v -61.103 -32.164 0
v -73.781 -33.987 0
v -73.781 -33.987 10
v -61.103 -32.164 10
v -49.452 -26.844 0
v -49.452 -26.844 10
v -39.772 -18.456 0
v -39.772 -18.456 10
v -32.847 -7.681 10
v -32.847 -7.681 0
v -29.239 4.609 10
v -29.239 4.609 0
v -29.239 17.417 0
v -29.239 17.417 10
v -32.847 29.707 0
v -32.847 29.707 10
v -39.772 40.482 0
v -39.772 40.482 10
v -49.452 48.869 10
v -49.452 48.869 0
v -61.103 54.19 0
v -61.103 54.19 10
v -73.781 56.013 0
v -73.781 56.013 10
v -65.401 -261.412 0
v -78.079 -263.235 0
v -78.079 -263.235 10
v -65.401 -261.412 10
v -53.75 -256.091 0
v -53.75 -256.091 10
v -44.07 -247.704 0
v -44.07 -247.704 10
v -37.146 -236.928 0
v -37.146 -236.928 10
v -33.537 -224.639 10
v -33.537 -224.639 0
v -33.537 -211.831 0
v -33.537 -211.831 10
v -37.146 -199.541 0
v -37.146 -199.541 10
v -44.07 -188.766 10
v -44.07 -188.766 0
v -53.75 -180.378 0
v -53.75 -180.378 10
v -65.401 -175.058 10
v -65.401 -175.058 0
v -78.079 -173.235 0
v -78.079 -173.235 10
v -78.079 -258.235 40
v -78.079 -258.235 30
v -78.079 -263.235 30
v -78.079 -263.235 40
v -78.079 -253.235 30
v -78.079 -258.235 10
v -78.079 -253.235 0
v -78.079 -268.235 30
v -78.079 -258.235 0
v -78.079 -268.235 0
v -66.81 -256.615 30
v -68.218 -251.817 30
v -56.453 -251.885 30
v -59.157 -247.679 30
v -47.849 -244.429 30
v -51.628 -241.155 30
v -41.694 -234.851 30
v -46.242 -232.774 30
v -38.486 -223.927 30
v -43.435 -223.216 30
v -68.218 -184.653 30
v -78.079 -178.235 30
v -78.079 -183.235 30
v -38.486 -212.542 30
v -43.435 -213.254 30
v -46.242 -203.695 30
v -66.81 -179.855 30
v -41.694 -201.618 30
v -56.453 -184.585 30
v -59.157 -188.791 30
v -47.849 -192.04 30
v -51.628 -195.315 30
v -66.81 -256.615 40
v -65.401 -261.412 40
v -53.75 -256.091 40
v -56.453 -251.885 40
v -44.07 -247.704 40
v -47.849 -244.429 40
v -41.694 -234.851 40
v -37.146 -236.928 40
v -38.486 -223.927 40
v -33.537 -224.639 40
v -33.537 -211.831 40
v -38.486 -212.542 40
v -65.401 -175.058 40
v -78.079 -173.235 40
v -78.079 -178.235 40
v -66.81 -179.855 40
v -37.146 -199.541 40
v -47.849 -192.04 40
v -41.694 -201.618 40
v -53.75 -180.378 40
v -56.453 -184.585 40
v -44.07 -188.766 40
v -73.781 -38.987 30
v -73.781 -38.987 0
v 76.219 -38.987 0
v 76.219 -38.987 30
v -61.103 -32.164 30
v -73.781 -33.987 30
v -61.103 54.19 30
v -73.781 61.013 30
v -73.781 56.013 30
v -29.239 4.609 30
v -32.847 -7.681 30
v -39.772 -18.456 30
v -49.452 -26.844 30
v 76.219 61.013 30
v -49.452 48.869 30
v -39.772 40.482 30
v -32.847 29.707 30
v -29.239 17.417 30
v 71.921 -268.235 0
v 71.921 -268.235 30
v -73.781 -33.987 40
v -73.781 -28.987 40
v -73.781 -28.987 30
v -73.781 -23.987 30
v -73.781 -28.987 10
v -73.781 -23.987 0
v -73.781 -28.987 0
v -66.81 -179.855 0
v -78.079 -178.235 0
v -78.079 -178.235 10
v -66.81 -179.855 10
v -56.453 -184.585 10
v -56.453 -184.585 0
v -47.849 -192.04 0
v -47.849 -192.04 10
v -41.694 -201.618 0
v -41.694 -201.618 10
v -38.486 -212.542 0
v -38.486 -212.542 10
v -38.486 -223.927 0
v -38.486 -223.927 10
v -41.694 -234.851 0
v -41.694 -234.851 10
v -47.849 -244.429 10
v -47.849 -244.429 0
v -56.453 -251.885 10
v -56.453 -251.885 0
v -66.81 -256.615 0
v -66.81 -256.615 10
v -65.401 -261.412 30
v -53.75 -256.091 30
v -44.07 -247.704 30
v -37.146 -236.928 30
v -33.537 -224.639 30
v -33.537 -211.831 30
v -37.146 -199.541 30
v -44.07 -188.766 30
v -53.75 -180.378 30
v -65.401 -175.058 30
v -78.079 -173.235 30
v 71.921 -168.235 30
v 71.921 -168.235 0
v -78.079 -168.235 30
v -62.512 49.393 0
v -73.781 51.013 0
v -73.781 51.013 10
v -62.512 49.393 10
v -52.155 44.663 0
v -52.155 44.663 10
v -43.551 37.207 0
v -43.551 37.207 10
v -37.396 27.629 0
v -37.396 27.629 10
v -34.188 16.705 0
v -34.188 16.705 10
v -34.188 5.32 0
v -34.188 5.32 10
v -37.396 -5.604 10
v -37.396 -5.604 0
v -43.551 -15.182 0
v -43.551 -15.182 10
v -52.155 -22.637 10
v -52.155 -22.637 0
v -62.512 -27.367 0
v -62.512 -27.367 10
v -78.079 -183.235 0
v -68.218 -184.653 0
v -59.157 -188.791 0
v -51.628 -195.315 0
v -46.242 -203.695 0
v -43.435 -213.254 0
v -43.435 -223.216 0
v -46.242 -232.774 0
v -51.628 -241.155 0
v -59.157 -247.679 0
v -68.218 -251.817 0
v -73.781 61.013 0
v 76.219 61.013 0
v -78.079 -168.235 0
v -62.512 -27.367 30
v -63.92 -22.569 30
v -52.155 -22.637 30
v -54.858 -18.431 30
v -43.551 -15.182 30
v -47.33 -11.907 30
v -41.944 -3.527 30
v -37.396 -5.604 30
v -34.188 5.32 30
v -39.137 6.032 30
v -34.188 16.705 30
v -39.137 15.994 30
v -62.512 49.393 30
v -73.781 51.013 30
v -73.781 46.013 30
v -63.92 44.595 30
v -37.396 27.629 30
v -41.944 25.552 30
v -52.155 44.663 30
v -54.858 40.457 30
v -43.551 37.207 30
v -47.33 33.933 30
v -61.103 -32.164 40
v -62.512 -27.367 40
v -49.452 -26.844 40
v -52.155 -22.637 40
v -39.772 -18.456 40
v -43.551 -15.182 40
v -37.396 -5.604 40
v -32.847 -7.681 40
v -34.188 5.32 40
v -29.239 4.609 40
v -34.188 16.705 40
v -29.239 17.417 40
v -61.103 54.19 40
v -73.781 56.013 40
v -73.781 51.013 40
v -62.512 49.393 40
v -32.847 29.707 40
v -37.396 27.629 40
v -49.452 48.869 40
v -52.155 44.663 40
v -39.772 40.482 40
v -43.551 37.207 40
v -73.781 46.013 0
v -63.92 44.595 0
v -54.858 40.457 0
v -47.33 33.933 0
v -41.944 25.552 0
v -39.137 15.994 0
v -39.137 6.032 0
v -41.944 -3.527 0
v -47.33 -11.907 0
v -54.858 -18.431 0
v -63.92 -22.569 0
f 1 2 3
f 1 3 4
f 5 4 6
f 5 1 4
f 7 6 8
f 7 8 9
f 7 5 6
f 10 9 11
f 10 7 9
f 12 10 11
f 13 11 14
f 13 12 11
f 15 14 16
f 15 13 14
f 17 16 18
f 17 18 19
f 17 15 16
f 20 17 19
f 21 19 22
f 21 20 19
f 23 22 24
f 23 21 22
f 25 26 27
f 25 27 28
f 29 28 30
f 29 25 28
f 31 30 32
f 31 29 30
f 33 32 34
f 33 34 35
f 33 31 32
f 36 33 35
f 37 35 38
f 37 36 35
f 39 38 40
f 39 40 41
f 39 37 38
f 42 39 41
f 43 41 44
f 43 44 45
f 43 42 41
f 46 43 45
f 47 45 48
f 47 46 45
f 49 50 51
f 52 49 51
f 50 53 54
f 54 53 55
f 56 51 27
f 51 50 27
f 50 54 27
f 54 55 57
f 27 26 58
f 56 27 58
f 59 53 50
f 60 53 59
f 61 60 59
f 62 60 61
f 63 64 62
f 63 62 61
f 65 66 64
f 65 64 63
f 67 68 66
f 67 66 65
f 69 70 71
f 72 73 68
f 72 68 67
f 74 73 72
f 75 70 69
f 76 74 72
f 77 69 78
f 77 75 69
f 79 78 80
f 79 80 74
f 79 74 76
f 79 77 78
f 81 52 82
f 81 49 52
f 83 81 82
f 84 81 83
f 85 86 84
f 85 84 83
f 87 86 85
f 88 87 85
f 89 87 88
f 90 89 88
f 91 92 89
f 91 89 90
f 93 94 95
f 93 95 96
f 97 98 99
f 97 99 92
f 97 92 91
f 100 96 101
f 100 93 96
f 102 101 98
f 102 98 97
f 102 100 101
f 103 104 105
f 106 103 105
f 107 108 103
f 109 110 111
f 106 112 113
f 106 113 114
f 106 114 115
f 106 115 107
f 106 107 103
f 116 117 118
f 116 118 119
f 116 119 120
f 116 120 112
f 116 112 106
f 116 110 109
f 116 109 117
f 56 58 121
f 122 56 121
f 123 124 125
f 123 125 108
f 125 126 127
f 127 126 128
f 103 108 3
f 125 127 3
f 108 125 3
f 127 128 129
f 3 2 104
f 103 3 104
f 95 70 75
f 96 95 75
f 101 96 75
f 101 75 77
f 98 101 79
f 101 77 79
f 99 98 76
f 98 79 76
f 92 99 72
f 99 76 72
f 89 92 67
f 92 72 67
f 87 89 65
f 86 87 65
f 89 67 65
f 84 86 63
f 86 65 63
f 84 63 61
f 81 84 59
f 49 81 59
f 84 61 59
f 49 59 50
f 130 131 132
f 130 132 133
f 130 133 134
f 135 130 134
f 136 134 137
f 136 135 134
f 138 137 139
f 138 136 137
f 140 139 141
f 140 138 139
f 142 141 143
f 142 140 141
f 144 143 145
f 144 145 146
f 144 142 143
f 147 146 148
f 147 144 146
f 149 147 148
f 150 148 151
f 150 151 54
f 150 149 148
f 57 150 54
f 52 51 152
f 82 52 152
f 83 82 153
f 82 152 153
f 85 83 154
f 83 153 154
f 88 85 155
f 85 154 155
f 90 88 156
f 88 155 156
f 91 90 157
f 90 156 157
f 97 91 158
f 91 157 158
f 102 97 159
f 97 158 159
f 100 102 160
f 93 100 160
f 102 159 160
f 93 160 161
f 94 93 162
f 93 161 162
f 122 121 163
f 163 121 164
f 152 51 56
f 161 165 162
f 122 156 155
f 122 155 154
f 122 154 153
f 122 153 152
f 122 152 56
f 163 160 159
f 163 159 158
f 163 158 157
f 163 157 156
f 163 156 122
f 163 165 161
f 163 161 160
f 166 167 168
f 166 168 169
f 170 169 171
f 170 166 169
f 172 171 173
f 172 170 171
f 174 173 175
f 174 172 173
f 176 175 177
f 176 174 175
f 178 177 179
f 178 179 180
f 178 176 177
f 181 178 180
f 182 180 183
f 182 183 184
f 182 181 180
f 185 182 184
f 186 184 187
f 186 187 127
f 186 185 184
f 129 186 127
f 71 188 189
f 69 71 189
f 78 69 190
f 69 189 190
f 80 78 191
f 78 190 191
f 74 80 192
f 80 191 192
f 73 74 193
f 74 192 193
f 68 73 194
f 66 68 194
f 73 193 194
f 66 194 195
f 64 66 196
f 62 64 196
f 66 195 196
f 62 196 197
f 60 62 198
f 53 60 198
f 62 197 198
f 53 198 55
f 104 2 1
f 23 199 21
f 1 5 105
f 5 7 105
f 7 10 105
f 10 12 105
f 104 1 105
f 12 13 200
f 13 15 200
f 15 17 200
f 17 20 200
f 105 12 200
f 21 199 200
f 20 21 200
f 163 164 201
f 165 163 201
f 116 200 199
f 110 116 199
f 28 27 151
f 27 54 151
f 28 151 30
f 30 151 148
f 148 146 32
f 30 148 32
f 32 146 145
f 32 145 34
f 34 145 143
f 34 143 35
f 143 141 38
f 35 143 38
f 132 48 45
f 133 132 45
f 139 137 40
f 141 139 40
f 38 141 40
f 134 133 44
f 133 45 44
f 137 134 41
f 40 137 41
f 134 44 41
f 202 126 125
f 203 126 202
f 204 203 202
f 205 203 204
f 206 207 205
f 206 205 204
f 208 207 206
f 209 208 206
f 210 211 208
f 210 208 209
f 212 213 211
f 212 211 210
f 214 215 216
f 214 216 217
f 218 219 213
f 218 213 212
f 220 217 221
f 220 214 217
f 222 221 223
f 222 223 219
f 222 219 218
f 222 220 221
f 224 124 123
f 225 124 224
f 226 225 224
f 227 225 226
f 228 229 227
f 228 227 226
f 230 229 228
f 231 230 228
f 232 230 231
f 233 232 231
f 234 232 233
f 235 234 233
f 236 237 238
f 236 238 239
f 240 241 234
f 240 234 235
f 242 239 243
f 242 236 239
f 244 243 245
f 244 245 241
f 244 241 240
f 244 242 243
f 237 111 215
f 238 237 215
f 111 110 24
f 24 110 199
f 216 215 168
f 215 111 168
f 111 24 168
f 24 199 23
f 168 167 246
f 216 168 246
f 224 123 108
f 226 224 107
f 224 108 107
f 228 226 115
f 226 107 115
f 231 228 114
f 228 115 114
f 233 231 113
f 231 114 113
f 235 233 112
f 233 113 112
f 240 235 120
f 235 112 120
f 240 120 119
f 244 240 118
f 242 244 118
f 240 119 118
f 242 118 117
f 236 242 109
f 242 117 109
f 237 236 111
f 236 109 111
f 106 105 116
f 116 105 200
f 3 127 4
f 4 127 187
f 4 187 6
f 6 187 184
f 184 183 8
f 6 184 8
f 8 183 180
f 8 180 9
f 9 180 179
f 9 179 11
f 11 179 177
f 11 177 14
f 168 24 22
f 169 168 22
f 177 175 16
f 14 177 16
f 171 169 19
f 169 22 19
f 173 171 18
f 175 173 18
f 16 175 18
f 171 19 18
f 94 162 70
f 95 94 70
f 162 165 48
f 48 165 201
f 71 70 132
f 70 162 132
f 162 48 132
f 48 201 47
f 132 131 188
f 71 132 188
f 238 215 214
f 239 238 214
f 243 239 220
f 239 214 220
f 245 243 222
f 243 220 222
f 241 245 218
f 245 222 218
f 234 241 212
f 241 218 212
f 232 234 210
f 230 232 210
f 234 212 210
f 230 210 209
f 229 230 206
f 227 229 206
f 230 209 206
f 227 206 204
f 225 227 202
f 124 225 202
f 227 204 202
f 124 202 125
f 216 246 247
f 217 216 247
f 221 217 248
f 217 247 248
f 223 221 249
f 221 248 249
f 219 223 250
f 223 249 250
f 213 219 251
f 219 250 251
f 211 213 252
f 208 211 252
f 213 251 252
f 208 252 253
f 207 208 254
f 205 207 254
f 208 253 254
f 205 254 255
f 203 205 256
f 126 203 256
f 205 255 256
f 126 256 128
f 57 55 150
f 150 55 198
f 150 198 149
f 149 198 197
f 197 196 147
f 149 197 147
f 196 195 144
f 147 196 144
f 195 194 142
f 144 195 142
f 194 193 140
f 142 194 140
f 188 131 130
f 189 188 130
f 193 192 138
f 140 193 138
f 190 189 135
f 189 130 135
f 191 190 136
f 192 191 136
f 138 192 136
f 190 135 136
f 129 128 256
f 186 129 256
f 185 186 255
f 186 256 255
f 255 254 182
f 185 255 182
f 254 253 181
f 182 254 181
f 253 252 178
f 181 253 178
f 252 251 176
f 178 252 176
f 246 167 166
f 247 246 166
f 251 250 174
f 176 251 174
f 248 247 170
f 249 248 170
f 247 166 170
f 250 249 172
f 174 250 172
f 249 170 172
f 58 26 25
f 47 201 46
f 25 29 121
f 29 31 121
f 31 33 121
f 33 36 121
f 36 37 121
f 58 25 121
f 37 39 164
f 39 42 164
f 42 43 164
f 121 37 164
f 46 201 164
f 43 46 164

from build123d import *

# Parameters (mm, degrees)
F1_DEPTH = 30
F2_DEPTH = 40
F3_DEPTH = 10


with BuildPart() as f1:
    # F0 (on Top) → F1 (new body)
    with BuildSketch(Plane.XY):
        with BuildLine():
            ThreePointArc((-78.0790522695, -258.2348191738), (-38.0790522695, -218.2348191738), (-78.0790522695, -178.2348191738))
            Line((-78.0790522695, -178.2348191738), (-78.0790522695, -183.2348191738))
            ThreePointArc((-78.0790522695, -183.2348191738), (-43.0790522695, -218.2348191738), (-78.0790522695, -253.2348191738))
            Line((-78.0790522695, -253.2348191738), (-78.0790522695, -258.2348191738))
        make_face()
        with BuildLine():
            ThreePointArc((-78.0790522695, -268.2348191738), (-28.0790522695, -218.2348191738), (-78.0790522695, -168.2348191738))
            Line((-78.0790522695, -168.2348191738), (-78.0790522695, -173.2348191738))
            ThreePointArc((-78.0790522695, -173.2348191738), (-33.0790522695, -218.2348191738), (-78.0790522695, -263.2348191738))
            Line((-78.0790522695, -263.2348191738), (-78.0790522695, -268.2348191738))
        make_face()
        with BuildLine():
            ThreePointArc((-78.0790522695, -263.2348191738), (-33.0790522695, -218.2348191738), (-78.0790522695, -173.2348191738))
            Line((-78.0790522695, -173.2348191738), (-78.0790522695, -178.2348191738))
            ThreePointArc((-78.0790522695, -178.2348191738), (-38.0790522695, -218.2348191738), (-78.0790522695, -258.2348191738))
            Line((-78.0790522695, -258.2348191738), (-78.0790522695, -263.2348191738))
        make_face()
        with BuildLine():
            Line((71.9209477305, -168.2348191738), (-78.0790522695, -168.2348191738))
            ThreePointArc((-78.0790522695, -168.2348191738), (-28.0790522695, -218.2348191738), (-78.0790522695, -268.2348191738))
            Line((-78.0790522695, -268.2348191738), (71.9209477305, -268.2348191738))
            Line((71.9209477305, -268.2348191738), (71.9209477305, -168.2348191738))
        make_face()
    extrude(amount=F1_DEPTH)

    # F0 (on Top) → F2 (join)
    with BuildSketch(Plane.XY):
        with BuildLine():
            ThreePointArc((-78.0790522695, -263.2348191738), (-33.0790522695, -218.2348191738), (-78.0790522695, -173.2348191738))
            Line((-78.0790522695, -173.2348191738), (-78.0790522695, -178.2348191738))
            ThreePointArc((-78.0790522695, -178.2348191738), (-38.0790522695, -218.2348191738), (-78.0790522695, -258.2348191738))
            Line((-78.0790522695, -258.2348191738), (-78.0790522695, -263.2348191738))
        make_face()
    extrude(amount=F2_DEPTH)


with BuildPart() as f1b:
    # F0 (on Top) → F1, piece 2 (new body)
    with BuildSketch(Plane.XY):
        with BuildLine():
            Line((76.2191157851, 61.0128335655), (-73.7808842149, 61.0128335655))
            ThreePointArc((-73.7808842149, 61.0128335655), (-23.7808842149, 11.0128335655), (-73.7808842149, -38.9871664345))
            Line((-73.7808842149, -38.9871664345), (76.2191157851, -38.9871664345))
            Line((76.2191157851, -38.9871664345), (76.2191157851, 61.0128335655))
        make_face()
        with BuildLine():
            ThreePointArc((-73.7808842149, -38.9871664345), (-23.7808842149, 11.0128335655), (-73.7808842149, 61.0128335655))
            Line((-73.7808842149, 61.0128335655), (-73.7808842149, 56.0128335655))
            ThreePointArc((-73.7808842149, 56.0128335655), (-28.7808842149, 11.0128335655), (-73.7808842149, -33.9871664345))
            Line((-73.7808842149, -33.9871664345), (-73.7808842149, -38.9871664345))
        make_face()
        with BuildLine():
            ThreePointArc((-73.7808842149, -33.9871664345), (-28.7808842149, 11.0128335655), (-73.7808842149, 56.0128335655))
            Line((-73.7808842149, 56.0128335655), (-73.7808842149, 51.0128335655))
            ThreePointArc((-73.7808842149, 51.0128335655), (-33.7808842149, 11.0128335655), (-73.7808842149, -28.9871664345))
            Line((-73.7808842149, -28.9871664345), (-73.7808842149, -33.9871664345))
        make_face()
        with BuildLine():
            ThreePointArc((-73.7808842149, -28.9871664345), (-33.7808842149, 11.0128335655), (-73.7808842149, 51.0128335655))
            Line((-73.7808842149, 51.0128335655), (-73.7808842149, 46.0128335655))
            ThreePointArc((-73.7808842149, 46.0128335655), (-38.7808842149, 11.0128335655), (-73.7808842149, -23.9871664345))
            Line((-73.7808842149, -23.9871664345), (-73.7808842149, -28.9871664345))
        make_face()
    extrude(amount=F1_DEPTH)

    # F0 (on Top) → F2, piece 2 (join)
    with BuildSketch(Plane.XY):
        with BuildLine():
            ThreePointArc((-73.7808842149, -33.9871664345), (-28.7808842149, 11.0128335655), (-73.7808842149, 56.0128335655))
            Line((-73.7808842149, 56.0128335655), (-73.7808842149, 51.0128335655))
            ThreePointArc((-73.7808842149, 51.0128335655), (-33.7808842149, 11.0128335655), (-73.7808842149, -28.9871664345))
            Line((-73.7808842149, -28.9871664345), (-73.7808842149, -33.9871664345))
        make_face()
    extrude(amount=F2_DEPTH)


with BuildPart() as f3_tool:
    # F0 (on Top) → F3 (new body)
    with BuildSketch(Plane.XY):
        with BuildLine():
            ThreePointArc((-78.0790522695, -263.2348191738), (-33.0790522695, -218.2348191738), (-78.0790522695, -173.2348191738))
            Line((-78.0790522695, -173.2348191738), (-78.0790522695, -178.2348191738))
            ThreePointArc((-78.0790522695, -178.2348191738), (-38.0790522695, -218.2348191738), (-78.0790522695, -258.2348191738))
            Line((-78.0790522695, -258.2348191738), (-78.0790522695, -263.2348191738))
        make_face()
        with BuildLine():
            ThreePointArc((-73.7808842149, -33.9871664345), (-28.7808842149, 11.0128335655), (-73.7808842149, 56.0128335655))
            Line((-73.7808842149, 56.0128335655), (-73.7808842149, 51.0128335655))
            ThreePointArc((-73.7808842149, 51.0128335655), (-33.7808842149, 11.0128335655), (-73.7808842149, -28.9871664345))
            Line((-73.7808842149, -28.9871664345), (-73.7808842149, -33.9871664345))
        make_face()
    extrude(amount=F3_DEPTH)


with BuildPart() as f1_1:
    add(f1.part)

    # F3: cut by f3_tool
    add(f3_tool.part, mode=Mode.SUBTRACT)


with BuildPart() as f1b_1:
    add(f1b.part)

    # F3: cut by f3_tool
    add(f3_tool.part, mode=Mode.SUBTRACT)


solid = Compound([f1_1.part, f1b_1.part])
